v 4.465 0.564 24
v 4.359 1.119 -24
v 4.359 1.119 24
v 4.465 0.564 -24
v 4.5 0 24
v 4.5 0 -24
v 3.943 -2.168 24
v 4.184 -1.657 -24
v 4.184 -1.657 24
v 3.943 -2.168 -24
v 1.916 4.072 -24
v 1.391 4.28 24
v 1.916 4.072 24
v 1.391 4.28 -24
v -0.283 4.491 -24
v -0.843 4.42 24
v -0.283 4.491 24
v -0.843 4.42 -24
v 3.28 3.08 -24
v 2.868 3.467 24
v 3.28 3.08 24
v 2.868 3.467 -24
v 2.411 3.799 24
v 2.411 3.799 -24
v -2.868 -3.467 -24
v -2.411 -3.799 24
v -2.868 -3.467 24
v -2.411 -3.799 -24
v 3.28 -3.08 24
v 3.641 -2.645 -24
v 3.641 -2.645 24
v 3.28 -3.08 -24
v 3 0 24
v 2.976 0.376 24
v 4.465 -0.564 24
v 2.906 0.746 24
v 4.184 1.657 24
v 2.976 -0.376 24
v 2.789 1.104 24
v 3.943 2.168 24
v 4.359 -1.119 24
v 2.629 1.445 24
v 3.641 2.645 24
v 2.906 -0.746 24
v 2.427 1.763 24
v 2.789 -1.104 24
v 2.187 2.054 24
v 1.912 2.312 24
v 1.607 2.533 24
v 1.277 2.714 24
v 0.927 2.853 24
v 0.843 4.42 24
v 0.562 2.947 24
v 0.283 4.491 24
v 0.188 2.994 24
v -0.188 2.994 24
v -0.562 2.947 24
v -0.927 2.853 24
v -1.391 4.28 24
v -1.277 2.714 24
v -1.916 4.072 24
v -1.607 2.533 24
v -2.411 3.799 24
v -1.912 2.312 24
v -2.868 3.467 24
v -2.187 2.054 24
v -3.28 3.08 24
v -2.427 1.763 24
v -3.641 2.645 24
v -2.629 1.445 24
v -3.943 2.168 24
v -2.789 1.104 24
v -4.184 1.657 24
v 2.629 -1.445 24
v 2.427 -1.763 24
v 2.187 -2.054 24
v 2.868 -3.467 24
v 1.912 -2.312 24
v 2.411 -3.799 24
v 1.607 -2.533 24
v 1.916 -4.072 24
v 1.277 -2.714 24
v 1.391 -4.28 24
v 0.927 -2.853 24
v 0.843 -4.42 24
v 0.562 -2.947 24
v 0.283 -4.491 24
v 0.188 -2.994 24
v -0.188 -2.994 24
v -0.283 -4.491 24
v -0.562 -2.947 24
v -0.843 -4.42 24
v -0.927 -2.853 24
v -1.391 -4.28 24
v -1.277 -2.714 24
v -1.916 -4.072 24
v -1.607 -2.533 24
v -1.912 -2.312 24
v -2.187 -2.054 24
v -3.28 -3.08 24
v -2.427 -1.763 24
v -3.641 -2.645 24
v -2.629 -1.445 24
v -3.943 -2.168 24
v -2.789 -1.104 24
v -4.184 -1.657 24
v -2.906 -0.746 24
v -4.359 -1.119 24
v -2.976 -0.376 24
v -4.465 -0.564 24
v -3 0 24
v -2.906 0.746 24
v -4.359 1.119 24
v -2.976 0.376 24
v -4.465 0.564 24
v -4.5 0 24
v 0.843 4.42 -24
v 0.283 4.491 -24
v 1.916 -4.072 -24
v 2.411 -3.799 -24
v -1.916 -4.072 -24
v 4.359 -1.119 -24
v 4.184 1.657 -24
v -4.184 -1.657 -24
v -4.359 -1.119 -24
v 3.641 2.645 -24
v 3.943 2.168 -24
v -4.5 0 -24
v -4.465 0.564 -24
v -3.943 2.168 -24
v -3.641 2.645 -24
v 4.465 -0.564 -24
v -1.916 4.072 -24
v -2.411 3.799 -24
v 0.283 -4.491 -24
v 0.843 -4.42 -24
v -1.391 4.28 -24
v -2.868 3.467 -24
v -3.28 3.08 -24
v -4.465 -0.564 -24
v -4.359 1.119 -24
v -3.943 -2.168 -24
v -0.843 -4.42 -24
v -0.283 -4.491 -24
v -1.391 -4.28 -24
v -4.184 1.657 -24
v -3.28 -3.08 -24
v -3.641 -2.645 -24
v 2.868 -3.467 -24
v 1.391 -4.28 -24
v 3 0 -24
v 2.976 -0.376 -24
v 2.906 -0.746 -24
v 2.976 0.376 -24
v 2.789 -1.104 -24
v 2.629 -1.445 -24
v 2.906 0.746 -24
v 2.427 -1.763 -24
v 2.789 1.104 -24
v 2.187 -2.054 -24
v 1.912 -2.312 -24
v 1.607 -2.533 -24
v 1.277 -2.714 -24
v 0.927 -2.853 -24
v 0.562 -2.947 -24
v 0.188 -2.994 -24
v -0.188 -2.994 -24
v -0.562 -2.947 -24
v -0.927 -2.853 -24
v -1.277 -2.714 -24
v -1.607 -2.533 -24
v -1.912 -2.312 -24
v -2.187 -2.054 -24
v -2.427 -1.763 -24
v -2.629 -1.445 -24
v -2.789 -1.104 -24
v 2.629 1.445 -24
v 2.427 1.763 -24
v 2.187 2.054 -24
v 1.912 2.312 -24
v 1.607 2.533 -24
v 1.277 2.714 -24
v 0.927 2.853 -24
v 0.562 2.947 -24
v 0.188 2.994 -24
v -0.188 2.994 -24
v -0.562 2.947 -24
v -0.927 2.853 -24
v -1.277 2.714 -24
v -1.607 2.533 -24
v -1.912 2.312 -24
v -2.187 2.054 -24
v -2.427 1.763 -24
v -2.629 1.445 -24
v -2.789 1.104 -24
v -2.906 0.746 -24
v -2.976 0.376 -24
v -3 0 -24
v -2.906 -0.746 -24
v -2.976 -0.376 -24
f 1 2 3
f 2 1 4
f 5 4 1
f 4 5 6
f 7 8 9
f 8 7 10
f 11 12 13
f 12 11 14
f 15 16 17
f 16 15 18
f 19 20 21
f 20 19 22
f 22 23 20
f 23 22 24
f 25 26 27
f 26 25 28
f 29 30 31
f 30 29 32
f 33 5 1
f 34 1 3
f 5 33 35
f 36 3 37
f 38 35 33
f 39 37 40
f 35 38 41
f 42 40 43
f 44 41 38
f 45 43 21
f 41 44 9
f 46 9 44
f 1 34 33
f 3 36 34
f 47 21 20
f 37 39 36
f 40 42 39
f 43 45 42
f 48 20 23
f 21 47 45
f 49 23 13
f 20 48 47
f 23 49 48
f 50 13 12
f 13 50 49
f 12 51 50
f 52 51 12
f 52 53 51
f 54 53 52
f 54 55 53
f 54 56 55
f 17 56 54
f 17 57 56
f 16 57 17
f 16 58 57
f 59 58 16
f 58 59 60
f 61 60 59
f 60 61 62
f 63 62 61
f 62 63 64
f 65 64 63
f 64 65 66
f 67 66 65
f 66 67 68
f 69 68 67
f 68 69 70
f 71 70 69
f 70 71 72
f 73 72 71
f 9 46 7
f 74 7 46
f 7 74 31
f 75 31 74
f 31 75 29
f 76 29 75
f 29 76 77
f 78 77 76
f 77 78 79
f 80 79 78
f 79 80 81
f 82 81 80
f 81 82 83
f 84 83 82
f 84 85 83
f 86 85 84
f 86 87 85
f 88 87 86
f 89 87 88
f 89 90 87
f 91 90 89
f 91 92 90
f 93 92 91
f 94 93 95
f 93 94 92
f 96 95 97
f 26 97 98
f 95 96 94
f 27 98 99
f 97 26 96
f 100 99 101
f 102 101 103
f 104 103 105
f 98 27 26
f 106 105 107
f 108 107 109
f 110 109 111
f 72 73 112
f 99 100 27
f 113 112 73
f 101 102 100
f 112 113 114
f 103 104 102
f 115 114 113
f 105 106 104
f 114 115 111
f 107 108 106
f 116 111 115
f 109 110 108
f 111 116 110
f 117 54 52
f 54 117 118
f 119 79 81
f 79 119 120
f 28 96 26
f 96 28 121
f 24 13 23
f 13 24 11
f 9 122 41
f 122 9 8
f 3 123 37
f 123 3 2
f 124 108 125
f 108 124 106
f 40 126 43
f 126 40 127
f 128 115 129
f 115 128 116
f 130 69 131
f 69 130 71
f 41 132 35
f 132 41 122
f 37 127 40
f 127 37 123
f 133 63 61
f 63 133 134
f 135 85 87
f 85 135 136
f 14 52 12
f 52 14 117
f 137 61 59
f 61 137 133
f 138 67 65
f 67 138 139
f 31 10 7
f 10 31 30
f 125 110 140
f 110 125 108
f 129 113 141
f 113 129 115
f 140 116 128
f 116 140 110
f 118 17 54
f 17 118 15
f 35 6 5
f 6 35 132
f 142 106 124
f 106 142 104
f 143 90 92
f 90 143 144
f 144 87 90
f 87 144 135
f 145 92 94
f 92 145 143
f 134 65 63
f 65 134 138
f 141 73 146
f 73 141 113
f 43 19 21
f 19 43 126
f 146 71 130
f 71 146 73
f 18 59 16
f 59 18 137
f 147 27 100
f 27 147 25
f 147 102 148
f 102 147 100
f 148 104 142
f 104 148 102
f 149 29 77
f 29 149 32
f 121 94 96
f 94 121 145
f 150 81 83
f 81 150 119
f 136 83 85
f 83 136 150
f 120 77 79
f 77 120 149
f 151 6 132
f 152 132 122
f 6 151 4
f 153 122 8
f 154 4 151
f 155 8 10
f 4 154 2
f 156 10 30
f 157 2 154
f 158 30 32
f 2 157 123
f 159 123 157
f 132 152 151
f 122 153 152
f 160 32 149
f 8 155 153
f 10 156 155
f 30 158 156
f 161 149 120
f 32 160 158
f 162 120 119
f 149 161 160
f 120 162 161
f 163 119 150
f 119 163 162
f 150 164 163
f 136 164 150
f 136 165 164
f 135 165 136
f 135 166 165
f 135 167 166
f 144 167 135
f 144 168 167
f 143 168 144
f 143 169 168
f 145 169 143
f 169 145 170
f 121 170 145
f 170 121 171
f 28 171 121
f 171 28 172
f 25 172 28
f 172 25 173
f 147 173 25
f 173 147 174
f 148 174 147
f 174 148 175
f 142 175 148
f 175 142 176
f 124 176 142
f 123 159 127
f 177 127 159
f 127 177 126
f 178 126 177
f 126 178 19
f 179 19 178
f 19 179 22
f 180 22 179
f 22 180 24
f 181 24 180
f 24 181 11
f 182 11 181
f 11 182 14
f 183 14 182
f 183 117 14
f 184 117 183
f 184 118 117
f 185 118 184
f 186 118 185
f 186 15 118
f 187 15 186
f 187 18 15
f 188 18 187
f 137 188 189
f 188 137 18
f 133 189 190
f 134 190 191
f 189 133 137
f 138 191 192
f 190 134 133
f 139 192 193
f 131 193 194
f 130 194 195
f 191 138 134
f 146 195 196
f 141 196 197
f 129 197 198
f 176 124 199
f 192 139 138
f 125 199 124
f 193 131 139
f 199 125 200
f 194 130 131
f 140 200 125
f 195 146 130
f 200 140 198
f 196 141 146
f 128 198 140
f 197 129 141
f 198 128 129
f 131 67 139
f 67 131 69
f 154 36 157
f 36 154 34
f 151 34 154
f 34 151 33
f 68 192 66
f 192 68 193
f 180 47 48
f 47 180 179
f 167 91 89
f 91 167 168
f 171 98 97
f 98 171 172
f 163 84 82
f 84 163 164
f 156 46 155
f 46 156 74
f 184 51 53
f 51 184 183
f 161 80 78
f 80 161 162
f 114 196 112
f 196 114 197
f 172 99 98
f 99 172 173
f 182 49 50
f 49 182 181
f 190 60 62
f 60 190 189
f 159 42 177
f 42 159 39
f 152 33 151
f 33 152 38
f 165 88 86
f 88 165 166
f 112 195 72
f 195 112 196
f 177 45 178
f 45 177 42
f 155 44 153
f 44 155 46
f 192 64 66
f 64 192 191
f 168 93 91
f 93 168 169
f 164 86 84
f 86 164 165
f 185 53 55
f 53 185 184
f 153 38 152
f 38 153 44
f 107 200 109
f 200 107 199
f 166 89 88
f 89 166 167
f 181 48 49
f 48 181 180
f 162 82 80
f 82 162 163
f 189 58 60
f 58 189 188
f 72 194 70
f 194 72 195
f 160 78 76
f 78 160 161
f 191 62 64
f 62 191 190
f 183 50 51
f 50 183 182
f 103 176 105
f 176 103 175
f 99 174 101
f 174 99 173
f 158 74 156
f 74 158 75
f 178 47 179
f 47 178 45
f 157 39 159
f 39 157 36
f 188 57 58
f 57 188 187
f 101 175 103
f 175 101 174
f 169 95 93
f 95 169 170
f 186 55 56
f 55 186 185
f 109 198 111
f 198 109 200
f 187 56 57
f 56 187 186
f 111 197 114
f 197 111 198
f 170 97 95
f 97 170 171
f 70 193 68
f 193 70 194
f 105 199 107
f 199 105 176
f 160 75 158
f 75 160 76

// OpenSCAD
$fn = 50;


difference() {
	union() {
		translate(v = [0, 0, -24.0000000000]) {
			cylinder(h = 48, r = 4.5000000000);
		}
	}
	union() {
		translate(v = [0, 0, -100.0000000000]) {
			cylinder(h = 200, r = 3.0000000000);
		}
	}
}
